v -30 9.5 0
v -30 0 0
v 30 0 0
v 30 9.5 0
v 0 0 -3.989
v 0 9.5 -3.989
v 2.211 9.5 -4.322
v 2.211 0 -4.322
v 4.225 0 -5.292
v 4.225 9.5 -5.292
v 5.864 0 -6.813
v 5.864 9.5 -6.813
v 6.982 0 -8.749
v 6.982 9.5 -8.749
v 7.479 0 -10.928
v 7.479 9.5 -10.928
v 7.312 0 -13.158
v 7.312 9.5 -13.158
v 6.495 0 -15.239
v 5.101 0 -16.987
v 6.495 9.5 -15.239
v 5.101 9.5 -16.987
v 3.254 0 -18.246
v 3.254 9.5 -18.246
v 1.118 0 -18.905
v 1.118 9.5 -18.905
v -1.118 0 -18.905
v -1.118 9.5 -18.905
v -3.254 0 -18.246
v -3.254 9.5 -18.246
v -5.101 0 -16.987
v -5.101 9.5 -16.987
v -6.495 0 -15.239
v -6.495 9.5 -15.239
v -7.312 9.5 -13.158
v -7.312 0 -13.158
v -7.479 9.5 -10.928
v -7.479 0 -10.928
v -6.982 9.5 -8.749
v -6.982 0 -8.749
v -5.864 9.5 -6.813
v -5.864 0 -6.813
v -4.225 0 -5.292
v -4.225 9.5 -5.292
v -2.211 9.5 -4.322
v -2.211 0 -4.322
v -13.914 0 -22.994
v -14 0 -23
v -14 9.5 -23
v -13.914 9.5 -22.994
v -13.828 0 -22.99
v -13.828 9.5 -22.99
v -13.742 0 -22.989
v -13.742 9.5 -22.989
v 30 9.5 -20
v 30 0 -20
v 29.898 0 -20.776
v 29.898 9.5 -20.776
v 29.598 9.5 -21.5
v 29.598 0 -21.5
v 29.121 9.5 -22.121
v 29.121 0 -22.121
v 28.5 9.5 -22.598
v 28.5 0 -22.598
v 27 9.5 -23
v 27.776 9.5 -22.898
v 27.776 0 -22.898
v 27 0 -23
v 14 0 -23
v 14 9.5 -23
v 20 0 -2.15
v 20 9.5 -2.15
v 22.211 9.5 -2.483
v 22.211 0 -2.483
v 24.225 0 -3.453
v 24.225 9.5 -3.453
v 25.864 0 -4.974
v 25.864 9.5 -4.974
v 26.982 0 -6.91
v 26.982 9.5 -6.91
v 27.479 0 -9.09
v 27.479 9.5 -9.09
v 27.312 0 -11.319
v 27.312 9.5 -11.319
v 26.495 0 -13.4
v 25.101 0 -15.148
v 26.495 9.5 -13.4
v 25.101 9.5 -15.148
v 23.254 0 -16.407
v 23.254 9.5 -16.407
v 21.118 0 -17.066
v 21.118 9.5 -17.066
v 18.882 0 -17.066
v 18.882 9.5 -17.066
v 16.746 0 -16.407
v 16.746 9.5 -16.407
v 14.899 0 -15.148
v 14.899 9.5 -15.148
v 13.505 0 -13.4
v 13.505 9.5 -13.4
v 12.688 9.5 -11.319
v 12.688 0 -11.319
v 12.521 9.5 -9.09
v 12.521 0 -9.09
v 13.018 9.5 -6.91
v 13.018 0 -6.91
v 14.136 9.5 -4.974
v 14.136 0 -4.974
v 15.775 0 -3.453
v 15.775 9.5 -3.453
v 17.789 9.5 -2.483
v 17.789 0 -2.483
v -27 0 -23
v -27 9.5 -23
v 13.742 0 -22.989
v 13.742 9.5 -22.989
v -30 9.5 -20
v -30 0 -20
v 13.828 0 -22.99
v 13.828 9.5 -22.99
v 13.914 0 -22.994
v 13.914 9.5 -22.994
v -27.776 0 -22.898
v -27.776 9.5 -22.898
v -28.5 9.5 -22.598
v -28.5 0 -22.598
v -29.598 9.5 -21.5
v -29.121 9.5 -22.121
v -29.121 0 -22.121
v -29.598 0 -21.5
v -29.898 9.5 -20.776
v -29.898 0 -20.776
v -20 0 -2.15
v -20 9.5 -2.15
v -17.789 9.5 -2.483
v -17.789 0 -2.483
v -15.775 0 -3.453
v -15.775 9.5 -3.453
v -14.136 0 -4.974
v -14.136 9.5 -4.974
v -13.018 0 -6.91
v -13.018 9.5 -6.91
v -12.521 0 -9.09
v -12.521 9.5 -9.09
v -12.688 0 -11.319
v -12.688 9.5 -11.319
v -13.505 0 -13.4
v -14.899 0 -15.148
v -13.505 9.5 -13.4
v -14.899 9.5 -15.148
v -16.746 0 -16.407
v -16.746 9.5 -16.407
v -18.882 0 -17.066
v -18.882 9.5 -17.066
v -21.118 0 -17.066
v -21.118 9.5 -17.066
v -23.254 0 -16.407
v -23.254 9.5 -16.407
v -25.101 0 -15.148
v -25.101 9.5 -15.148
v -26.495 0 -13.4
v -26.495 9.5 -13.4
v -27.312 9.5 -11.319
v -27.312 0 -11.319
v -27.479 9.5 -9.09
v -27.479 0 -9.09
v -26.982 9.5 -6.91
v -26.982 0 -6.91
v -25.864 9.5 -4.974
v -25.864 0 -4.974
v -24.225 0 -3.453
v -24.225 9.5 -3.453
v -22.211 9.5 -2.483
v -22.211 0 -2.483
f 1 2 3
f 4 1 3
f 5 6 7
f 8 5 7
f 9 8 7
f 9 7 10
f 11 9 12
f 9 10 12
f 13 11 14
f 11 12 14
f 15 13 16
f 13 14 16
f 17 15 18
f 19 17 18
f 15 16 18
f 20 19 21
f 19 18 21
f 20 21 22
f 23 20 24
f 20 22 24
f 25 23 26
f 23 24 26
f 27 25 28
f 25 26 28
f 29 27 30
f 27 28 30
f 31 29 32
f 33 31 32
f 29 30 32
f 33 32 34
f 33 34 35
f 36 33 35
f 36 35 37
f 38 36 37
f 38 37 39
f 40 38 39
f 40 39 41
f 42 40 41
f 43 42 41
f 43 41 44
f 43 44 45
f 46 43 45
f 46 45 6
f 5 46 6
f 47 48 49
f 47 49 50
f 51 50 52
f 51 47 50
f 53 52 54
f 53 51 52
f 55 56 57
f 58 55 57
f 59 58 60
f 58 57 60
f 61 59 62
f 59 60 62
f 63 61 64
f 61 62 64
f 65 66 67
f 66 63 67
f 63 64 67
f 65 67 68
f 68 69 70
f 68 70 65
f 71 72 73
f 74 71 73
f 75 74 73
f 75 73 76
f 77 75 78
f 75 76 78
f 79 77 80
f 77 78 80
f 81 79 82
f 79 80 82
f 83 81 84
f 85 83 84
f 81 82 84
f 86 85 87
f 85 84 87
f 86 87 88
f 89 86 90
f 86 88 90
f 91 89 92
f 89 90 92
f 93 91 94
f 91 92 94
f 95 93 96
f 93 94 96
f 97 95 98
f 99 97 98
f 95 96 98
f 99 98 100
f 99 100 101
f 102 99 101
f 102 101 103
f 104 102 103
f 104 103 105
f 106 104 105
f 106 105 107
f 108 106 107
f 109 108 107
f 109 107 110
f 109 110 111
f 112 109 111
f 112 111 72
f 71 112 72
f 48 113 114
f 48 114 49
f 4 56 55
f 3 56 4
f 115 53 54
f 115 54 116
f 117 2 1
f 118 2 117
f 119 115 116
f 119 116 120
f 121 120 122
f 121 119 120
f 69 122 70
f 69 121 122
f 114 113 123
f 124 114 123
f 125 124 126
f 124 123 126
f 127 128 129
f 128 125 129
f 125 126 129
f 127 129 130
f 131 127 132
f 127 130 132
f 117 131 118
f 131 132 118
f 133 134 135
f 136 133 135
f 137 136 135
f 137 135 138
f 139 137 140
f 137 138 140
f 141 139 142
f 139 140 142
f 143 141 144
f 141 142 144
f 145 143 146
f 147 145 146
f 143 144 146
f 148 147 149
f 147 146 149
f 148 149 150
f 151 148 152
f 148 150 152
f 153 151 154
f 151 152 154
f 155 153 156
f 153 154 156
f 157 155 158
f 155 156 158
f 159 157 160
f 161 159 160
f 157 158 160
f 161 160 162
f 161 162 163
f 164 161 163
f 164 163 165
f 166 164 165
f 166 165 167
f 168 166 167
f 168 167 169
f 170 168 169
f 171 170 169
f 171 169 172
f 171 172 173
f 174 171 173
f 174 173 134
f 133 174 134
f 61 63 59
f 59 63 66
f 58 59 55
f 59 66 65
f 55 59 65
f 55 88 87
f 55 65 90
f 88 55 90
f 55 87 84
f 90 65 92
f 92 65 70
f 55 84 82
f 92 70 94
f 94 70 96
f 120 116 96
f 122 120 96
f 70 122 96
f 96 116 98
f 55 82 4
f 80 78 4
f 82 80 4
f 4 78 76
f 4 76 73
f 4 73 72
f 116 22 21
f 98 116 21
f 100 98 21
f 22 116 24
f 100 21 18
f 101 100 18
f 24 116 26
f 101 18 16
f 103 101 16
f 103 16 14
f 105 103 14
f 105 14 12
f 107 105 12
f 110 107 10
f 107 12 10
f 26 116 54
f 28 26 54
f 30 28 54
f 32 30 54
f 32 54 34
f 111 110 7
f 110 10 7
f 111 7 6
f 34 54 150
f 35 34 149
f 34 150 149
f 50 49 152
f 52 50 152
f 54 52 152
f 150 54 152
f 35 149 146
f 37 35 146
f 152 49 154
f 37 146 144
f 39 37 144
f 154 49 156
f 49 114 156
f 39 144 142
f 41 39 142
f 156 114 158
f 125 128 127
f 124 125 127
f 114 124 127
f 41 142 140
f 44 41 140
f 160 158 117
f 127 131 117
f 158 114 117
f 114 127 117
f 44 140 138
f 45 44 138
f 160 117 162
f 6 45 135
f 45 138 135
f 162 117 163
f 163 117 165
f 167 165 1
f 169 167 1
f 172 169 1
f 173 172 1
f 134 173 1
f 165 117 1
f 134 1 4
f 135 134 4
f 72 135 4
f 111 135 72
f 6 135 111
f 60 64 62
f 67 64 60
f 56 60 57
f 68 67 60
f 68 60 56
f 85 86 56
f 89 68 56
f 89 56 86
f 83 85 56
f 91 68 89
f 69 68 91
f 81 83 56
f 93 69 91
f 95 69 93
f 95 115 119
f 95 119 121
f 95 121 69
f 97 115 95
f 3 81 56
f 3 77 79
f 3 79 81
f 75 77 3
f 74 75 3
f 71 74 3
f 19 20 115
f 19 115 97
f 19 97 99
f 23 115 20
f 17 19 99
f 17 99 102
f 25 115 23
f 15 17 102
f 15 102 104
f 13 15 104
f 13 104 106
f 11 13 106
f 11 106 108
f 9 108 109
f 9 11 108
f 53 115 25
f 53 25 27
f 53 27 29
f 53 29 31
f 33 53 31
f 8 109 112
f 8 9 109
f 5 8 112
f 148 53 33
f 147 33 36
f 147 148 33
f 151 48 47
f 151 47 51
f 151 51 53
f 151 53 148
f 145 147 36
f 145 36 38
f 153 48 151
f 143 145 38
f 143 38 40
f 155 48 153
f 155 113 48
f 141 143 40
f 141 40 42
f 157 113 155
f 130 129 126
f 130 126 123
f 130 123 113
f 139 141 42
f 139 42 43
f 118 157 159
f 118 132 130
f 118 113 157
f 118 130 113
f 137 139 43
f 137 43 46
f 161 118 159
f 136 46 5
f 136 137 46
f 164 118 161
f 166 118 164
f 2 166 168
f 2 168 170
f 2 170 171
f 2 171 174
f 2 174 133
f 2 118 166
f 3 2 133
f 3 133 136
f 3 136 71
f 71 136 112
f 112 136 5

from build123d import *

# Parameters (mm, degrees)
EXTRUDE_1_DEPTH     = 9.5
SKETCH_3_R          = 7.5
CUT_EXTRUDE_2_DEPTH = 39.977557645
FILLET_2_R          = 3


with BuildPart() as part:
    # 草图1 → 凸台-拉伸1 (new body)
    with BuildSketch(Plane(origin=(0, 0, 0), x_dir=(1, 0, 0), z_dir=(0, 1, 0))):
        Polygon((0, 0), (-30, 0), (-30, 23), (-14, 23), (-14, 22.98886809), (14, 22.98886809), (14, 23), (30, 23), (30, 0), align=None)
    extrude(amount=EXTRUDE_1_DEPTH)

    # 草图3 → 切除-拉伸2 (cut, through all)
    with BuildSketch(Plane(origin=(0, 9.5, 0), x_dir=(1, 0, 0), z_dir=(0, 1, 0))):
        with Locations(Location((0, 11.48886809, 0), (0, 0, 270))):
            Circle(SKETCH_3_R)
        with Locations(Location((-20, 9.65, 0), (0, 0, 270))):
            Circle(SKETCH_3_R)
        with Locations(Location((20, 9.65, 0), (0, 0, 270))):
            Circle(SKETCH_3_R)
    extrude(amount=-CUT_EXTRUDE_2_DEPTH, mode=Mode.SUBTRACT)

    # 圆角2
    # the kernel refuses this fillet: 3 mm, written as the material it adds along each edge
    with BuildSketch(Plane(origin=(14, 0, -22.98886809), x_dir=(0, 0, -1), z_dir=(0, 1, 0))) as fillet_2_piece_1:
        with BuildLine():
            CenterArc((3, 0.25820058), FILLET_2_R, 180, 4.937376285)
            Line((0, 0.25820058), (0, 0))
            Line((0, 0), (0.01113191, 0))
        make_face()
    extrude(amount=9.5)
    with BuildSketch(Plane(origin=(-14, 0, -22.98886809), x_dir=(0, 0, -1), z_dir=(0, 1, 0))) as fillet_2_piece_2:
        with BuildLine():
            CenterArc((3, -0.25820058), FILLET_2_R, 175.062623715, 4.937376285)
            Line((0, -0.25820058), (0, 0))
            Line((0, 0), (0.01113191, 0))
        make_face()
    extrude(amount=9.5)
    # the kernel refuses this fillet: 3 mm, written as the material it takes off along each edge
    with BuildSketch(Plane(origin=(30, -7.5, -23), x_dir=(0, 0, 1), z_dir=(0, 1, 0))) as fillet_2_2_piece_1:
        with BuildLine():
            CenterArc((FILLET_2_R, -FILLET_2_R), FILLET_2_R, 90, 90)
            Line((0, -FILLET_2_R), (0, 0))
            Line((0, 0), (FILLET_2_R, 0))
        make_face()
    extrude(amount=24.5, mode=Mode.SUBTRACT)
    with BuildSketch(Plane(origin=(-30, -7.5, -23), x_dir=(0, 0, 1), z_dir=(0, 1, 0))) as fillet_2_2_piece_2:
        with BuildLine():
            CenterArc((FILLET_2_R, FILLET_2_R), FILLET_2_R, 180, 90)
            Line((0, FILLET_2_R), (0, 0))
            Line((0, 0), (FILLET_2_R, 0))
        make_face()
    extrude(amount=24.5, mode=Mode.SUBTRACT)


solid = part.part
